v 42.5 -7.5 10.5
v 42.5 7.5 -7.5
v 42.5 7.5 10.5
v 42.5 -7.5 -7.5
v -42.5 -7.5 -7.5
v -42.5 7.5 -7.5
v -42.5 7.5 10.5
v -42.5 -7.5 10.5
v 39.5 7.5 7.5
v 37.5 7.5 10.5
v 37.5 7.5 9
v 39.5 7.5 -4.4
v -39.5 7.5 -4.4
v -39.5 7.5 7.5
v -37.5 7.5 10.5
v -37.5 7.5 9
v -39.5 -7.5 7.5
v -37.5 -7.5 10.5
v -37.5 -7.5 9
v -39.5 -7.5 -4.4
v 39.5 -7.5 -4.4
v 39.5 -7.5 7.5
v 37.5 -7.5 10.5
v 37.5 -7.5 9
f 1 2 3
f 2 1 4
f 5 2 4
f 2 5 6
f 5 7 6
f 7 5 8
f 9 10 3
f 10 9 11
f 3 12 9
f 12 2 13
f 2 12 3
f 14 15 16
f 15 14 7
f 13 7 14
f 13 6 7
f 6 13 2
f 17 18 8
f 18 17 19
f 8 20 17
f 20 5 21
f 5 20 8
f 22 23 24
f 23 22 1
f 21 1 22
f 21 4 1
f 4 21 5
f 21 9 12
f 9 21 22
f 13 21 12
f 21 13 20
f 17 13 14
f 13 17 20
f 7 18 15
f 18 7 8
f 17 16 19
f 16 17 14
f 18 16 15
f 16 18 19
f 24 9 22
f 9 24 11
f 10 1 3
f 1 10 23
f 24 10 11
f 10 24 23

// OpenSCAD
slide_lenght = 15 ; //90

phone_hight = 12 ;
phone_widith = 79 ;

wall = 3 ;
tab_size = 5 ;

difference(){
	cube([phone_widith+wall*2,slide_lenght,phone_hight+wall],center=true);
	translate([0,0,wall/2+.1])cube([phone_widith,slide_lenght+.2,phone_hight],center=true);
}


tab();
mirror(0,1,0)tab();

mirror(1,0,0)tab();

module tab(){
	hull(){ //tabb
		translate([-phone_widith/2-wall,-slide_lenght/2,phone_hight/2+wall])cube([tab_size,slide_lenght,wall/2]); //Top
		translate([-phone_widith/2-wall,-slide_lenght/2,phone_hight/2+wall/2])cube([wall,slide_lenght,wall]); //Bottom
	}
}
/* 

hull(){	//tab
	mirror(0,1,0)translate([-phone_widith/2-wall,-slide_lenght/2,phone_hight/2+wall])cube([tab_size,slide_lenght,wall]);
	mirror(0,1,0)translate([-phone_widith/2-wall,-slide_lenght/2,phone_hight/2+wall/2])cube([wall,slide_lenght,wall]);
} */
